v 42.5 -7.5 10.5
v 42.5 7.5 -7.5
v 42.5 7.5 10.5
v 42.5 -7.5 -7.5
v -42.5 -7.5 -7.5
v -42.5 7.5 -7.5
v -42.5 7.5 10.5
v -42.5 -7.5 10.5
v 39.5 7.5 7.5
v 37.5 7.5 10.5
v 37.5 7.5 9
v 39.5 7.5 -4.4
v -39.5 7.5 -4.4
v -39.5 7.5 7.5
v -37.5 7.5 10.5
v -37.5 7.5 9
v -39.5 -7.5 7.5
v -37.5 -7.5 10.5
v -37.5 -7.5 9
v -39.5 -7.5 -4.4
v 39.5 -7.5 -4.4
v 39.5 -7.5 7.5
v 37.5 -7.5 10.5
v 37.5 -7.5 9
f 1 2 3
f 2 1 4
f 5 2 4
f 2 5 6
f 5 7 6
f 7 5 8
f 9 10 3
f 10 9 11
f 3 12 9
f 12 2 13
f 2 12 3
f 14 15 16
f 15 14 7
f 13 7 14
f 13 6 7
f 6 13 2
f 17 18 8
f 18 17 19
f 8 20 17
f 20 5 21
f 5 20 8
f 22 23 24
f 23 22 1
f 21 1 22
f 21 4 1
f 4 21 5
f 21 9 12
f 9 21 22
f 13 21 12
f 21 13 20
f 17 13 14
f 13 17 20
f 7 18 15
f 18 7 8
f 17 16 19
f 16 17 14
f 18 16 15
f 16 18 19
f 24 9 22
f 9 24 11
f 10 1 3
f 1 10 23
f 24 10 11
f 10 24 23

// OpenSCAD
slide_lenght = 15 ; //90

phone_hight = 12 ;
phone_widith = 79 ;

wall = 3 ;
tab_size = 5 ;

difference(){
	cube([phone_widith+wall*2,slide_lenght,phone_hight+wall],center=true);
	translate([0,0,wall/2+.1])cube([phone_widith,slide_lenght+.2,phone_hight],center=true);
}


tab();
mirror(0,1,0)tab();

mirror(1,0,0)tab();

module tab(){
	hull(){ //tabb
		translate([-phone_widith/2-wall,-slide_lenght/2,phone_hight/2+wall])cube([tab_size,slide_lenght,wall/2]); //Top
		translate([-phone_widith/2-wall,-slide_lenght/2,phone_hight/2+wall/2])cube([wall,slide_lenght,wall]); //Bottom
	}
}
/* 

hull(){	//tab
	mirror(0,1,0)translate([-phone_widith/2-wall,-slide_lenght/2,phone_hight/2+wall])cube([tab_size,slide_lenght,wall]);
	mirror(0,1,0)translate([-phone_widith/2-wall,-slide_lenght/2,phone_hight/2+wall/2])cube([wall,slide_lenght,wall]);
} */
